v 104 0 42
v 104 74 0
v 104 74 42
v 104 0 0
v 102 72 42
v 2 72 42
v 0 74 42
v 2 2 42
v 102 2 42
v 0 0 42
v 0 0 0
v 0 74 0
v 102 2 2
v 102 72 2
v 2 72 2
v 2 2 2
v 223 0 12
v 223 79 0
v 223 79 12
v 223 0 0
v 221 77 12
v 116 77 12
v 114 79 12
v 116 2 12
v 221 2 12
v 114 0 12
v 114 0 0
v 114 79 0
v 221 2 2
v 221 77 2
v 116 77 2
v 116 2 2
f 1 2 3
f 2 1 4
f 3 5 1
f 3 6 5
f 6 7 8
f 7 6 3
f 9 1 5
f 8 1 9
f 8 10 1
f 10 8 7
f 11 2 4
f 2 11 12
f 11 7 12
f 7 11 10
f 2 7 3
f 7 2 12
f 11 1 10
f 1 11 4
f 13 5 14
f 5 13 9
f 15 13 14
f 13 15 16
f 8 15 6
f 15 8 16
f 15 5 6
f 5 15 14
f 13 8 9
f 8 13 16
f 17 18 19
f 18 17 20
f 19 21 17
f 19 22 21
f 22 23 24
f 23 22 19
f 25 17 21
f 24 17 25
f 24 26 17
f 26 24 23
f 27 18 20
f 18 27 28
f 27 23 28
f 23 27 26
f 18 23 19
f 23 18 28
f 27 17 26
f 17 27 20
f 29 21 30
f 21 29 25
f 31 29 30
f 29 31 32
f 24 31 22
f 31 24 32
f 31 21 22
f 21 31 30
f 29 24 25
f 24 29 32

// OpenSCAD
// This is a box with a parameterized interior, thickness, lid tolerance, and lid overhang
interiorLength = 100;
interiorWidth = 70;
interiorHeight = 40;
wallThickness = 2;
lidTolerance = 0.5; // This is the amount larger than the exterior of the box the interior of the lid will be
lidOverhang = 10; // This is the amount that the lid hangs down past the top of the box. A value of 0 would result in a flat surface for the lid.

function getInteriorDimensions(interiorLength, interiorWidth, interiorHeight) = [interiorLength, interiorWidth, interiorHeight];
function getExteriorDimensions(interiorLength, interiorWidth, interiorHeight, wallThickness) = [interiorLength, interiorWidth, interiorHeight] + [2*wallThickness, 2*wallThickness, wallThickness];
function getLidInteriorDimensions(exteriorDimensions, lidTolerance, lidOverhang) = [exteriorDimensions[0]+(2*lidTolerance), exteriorDimensions[1]+2*lidTolerance, lidOverhang];
function getLidExteriorDimensions(lidInteriorDimensions, wallThickness) = lidInteriorDimensions + [2*wallThickness, 2*wallThickness, wallThickness];

// Box
module parameterized_box(interiorLength, interiorWidth, interiorHeight, wallThickness){
    interiorDimensions = getInteriorDimensions(interiorLength, interiorWidth, interiorHeight);
    exteriorDimensions = getExteriorDimensions(interiorLength, interiorWidth, interiorHeight, wallThickness);

    difference(){
        cube(exteriorDimensions, center=false);
        translate([wallThickness, wallThickness, wallThickness]){
            cube(interiorDimensions, center=false);
        }
    }
}

// Lid
module parameterized_lid(interiorLength, interiorWidth, interiorHeight, wallThickness, lidTolerance, lidOverhang){
    exteriorDimensions = getExteriorDimensions(interiorLength, interiorWidth, interiorHeight, wallThickness);
    lidInteriorDimensions = getLidInteriorDimensions(exteriorDimensions, lidTolerance, lidOverhang);
    lidExteriorDimensions = getLidExteriorDimensions(lidInteriorDimensions, wallThickness);

    difference(){
        cube(lidExteriorDimensions, center=false);
        translate([wallThickness, wallThickness, wallThickness]){
            cube(lidInteriorDimensions, center=false);
        }
    }
}

parameterized_box(interiorLength, interiorWidth, interiorHeight, wallThickness);
translate([interiorLength*1.1+wallThickness*2, 0, 0]){
    parameterized_lid(interiorLength, interiorWidth, interiorHeight, wallThickness, lidTolerance, lidOverhang);
}
